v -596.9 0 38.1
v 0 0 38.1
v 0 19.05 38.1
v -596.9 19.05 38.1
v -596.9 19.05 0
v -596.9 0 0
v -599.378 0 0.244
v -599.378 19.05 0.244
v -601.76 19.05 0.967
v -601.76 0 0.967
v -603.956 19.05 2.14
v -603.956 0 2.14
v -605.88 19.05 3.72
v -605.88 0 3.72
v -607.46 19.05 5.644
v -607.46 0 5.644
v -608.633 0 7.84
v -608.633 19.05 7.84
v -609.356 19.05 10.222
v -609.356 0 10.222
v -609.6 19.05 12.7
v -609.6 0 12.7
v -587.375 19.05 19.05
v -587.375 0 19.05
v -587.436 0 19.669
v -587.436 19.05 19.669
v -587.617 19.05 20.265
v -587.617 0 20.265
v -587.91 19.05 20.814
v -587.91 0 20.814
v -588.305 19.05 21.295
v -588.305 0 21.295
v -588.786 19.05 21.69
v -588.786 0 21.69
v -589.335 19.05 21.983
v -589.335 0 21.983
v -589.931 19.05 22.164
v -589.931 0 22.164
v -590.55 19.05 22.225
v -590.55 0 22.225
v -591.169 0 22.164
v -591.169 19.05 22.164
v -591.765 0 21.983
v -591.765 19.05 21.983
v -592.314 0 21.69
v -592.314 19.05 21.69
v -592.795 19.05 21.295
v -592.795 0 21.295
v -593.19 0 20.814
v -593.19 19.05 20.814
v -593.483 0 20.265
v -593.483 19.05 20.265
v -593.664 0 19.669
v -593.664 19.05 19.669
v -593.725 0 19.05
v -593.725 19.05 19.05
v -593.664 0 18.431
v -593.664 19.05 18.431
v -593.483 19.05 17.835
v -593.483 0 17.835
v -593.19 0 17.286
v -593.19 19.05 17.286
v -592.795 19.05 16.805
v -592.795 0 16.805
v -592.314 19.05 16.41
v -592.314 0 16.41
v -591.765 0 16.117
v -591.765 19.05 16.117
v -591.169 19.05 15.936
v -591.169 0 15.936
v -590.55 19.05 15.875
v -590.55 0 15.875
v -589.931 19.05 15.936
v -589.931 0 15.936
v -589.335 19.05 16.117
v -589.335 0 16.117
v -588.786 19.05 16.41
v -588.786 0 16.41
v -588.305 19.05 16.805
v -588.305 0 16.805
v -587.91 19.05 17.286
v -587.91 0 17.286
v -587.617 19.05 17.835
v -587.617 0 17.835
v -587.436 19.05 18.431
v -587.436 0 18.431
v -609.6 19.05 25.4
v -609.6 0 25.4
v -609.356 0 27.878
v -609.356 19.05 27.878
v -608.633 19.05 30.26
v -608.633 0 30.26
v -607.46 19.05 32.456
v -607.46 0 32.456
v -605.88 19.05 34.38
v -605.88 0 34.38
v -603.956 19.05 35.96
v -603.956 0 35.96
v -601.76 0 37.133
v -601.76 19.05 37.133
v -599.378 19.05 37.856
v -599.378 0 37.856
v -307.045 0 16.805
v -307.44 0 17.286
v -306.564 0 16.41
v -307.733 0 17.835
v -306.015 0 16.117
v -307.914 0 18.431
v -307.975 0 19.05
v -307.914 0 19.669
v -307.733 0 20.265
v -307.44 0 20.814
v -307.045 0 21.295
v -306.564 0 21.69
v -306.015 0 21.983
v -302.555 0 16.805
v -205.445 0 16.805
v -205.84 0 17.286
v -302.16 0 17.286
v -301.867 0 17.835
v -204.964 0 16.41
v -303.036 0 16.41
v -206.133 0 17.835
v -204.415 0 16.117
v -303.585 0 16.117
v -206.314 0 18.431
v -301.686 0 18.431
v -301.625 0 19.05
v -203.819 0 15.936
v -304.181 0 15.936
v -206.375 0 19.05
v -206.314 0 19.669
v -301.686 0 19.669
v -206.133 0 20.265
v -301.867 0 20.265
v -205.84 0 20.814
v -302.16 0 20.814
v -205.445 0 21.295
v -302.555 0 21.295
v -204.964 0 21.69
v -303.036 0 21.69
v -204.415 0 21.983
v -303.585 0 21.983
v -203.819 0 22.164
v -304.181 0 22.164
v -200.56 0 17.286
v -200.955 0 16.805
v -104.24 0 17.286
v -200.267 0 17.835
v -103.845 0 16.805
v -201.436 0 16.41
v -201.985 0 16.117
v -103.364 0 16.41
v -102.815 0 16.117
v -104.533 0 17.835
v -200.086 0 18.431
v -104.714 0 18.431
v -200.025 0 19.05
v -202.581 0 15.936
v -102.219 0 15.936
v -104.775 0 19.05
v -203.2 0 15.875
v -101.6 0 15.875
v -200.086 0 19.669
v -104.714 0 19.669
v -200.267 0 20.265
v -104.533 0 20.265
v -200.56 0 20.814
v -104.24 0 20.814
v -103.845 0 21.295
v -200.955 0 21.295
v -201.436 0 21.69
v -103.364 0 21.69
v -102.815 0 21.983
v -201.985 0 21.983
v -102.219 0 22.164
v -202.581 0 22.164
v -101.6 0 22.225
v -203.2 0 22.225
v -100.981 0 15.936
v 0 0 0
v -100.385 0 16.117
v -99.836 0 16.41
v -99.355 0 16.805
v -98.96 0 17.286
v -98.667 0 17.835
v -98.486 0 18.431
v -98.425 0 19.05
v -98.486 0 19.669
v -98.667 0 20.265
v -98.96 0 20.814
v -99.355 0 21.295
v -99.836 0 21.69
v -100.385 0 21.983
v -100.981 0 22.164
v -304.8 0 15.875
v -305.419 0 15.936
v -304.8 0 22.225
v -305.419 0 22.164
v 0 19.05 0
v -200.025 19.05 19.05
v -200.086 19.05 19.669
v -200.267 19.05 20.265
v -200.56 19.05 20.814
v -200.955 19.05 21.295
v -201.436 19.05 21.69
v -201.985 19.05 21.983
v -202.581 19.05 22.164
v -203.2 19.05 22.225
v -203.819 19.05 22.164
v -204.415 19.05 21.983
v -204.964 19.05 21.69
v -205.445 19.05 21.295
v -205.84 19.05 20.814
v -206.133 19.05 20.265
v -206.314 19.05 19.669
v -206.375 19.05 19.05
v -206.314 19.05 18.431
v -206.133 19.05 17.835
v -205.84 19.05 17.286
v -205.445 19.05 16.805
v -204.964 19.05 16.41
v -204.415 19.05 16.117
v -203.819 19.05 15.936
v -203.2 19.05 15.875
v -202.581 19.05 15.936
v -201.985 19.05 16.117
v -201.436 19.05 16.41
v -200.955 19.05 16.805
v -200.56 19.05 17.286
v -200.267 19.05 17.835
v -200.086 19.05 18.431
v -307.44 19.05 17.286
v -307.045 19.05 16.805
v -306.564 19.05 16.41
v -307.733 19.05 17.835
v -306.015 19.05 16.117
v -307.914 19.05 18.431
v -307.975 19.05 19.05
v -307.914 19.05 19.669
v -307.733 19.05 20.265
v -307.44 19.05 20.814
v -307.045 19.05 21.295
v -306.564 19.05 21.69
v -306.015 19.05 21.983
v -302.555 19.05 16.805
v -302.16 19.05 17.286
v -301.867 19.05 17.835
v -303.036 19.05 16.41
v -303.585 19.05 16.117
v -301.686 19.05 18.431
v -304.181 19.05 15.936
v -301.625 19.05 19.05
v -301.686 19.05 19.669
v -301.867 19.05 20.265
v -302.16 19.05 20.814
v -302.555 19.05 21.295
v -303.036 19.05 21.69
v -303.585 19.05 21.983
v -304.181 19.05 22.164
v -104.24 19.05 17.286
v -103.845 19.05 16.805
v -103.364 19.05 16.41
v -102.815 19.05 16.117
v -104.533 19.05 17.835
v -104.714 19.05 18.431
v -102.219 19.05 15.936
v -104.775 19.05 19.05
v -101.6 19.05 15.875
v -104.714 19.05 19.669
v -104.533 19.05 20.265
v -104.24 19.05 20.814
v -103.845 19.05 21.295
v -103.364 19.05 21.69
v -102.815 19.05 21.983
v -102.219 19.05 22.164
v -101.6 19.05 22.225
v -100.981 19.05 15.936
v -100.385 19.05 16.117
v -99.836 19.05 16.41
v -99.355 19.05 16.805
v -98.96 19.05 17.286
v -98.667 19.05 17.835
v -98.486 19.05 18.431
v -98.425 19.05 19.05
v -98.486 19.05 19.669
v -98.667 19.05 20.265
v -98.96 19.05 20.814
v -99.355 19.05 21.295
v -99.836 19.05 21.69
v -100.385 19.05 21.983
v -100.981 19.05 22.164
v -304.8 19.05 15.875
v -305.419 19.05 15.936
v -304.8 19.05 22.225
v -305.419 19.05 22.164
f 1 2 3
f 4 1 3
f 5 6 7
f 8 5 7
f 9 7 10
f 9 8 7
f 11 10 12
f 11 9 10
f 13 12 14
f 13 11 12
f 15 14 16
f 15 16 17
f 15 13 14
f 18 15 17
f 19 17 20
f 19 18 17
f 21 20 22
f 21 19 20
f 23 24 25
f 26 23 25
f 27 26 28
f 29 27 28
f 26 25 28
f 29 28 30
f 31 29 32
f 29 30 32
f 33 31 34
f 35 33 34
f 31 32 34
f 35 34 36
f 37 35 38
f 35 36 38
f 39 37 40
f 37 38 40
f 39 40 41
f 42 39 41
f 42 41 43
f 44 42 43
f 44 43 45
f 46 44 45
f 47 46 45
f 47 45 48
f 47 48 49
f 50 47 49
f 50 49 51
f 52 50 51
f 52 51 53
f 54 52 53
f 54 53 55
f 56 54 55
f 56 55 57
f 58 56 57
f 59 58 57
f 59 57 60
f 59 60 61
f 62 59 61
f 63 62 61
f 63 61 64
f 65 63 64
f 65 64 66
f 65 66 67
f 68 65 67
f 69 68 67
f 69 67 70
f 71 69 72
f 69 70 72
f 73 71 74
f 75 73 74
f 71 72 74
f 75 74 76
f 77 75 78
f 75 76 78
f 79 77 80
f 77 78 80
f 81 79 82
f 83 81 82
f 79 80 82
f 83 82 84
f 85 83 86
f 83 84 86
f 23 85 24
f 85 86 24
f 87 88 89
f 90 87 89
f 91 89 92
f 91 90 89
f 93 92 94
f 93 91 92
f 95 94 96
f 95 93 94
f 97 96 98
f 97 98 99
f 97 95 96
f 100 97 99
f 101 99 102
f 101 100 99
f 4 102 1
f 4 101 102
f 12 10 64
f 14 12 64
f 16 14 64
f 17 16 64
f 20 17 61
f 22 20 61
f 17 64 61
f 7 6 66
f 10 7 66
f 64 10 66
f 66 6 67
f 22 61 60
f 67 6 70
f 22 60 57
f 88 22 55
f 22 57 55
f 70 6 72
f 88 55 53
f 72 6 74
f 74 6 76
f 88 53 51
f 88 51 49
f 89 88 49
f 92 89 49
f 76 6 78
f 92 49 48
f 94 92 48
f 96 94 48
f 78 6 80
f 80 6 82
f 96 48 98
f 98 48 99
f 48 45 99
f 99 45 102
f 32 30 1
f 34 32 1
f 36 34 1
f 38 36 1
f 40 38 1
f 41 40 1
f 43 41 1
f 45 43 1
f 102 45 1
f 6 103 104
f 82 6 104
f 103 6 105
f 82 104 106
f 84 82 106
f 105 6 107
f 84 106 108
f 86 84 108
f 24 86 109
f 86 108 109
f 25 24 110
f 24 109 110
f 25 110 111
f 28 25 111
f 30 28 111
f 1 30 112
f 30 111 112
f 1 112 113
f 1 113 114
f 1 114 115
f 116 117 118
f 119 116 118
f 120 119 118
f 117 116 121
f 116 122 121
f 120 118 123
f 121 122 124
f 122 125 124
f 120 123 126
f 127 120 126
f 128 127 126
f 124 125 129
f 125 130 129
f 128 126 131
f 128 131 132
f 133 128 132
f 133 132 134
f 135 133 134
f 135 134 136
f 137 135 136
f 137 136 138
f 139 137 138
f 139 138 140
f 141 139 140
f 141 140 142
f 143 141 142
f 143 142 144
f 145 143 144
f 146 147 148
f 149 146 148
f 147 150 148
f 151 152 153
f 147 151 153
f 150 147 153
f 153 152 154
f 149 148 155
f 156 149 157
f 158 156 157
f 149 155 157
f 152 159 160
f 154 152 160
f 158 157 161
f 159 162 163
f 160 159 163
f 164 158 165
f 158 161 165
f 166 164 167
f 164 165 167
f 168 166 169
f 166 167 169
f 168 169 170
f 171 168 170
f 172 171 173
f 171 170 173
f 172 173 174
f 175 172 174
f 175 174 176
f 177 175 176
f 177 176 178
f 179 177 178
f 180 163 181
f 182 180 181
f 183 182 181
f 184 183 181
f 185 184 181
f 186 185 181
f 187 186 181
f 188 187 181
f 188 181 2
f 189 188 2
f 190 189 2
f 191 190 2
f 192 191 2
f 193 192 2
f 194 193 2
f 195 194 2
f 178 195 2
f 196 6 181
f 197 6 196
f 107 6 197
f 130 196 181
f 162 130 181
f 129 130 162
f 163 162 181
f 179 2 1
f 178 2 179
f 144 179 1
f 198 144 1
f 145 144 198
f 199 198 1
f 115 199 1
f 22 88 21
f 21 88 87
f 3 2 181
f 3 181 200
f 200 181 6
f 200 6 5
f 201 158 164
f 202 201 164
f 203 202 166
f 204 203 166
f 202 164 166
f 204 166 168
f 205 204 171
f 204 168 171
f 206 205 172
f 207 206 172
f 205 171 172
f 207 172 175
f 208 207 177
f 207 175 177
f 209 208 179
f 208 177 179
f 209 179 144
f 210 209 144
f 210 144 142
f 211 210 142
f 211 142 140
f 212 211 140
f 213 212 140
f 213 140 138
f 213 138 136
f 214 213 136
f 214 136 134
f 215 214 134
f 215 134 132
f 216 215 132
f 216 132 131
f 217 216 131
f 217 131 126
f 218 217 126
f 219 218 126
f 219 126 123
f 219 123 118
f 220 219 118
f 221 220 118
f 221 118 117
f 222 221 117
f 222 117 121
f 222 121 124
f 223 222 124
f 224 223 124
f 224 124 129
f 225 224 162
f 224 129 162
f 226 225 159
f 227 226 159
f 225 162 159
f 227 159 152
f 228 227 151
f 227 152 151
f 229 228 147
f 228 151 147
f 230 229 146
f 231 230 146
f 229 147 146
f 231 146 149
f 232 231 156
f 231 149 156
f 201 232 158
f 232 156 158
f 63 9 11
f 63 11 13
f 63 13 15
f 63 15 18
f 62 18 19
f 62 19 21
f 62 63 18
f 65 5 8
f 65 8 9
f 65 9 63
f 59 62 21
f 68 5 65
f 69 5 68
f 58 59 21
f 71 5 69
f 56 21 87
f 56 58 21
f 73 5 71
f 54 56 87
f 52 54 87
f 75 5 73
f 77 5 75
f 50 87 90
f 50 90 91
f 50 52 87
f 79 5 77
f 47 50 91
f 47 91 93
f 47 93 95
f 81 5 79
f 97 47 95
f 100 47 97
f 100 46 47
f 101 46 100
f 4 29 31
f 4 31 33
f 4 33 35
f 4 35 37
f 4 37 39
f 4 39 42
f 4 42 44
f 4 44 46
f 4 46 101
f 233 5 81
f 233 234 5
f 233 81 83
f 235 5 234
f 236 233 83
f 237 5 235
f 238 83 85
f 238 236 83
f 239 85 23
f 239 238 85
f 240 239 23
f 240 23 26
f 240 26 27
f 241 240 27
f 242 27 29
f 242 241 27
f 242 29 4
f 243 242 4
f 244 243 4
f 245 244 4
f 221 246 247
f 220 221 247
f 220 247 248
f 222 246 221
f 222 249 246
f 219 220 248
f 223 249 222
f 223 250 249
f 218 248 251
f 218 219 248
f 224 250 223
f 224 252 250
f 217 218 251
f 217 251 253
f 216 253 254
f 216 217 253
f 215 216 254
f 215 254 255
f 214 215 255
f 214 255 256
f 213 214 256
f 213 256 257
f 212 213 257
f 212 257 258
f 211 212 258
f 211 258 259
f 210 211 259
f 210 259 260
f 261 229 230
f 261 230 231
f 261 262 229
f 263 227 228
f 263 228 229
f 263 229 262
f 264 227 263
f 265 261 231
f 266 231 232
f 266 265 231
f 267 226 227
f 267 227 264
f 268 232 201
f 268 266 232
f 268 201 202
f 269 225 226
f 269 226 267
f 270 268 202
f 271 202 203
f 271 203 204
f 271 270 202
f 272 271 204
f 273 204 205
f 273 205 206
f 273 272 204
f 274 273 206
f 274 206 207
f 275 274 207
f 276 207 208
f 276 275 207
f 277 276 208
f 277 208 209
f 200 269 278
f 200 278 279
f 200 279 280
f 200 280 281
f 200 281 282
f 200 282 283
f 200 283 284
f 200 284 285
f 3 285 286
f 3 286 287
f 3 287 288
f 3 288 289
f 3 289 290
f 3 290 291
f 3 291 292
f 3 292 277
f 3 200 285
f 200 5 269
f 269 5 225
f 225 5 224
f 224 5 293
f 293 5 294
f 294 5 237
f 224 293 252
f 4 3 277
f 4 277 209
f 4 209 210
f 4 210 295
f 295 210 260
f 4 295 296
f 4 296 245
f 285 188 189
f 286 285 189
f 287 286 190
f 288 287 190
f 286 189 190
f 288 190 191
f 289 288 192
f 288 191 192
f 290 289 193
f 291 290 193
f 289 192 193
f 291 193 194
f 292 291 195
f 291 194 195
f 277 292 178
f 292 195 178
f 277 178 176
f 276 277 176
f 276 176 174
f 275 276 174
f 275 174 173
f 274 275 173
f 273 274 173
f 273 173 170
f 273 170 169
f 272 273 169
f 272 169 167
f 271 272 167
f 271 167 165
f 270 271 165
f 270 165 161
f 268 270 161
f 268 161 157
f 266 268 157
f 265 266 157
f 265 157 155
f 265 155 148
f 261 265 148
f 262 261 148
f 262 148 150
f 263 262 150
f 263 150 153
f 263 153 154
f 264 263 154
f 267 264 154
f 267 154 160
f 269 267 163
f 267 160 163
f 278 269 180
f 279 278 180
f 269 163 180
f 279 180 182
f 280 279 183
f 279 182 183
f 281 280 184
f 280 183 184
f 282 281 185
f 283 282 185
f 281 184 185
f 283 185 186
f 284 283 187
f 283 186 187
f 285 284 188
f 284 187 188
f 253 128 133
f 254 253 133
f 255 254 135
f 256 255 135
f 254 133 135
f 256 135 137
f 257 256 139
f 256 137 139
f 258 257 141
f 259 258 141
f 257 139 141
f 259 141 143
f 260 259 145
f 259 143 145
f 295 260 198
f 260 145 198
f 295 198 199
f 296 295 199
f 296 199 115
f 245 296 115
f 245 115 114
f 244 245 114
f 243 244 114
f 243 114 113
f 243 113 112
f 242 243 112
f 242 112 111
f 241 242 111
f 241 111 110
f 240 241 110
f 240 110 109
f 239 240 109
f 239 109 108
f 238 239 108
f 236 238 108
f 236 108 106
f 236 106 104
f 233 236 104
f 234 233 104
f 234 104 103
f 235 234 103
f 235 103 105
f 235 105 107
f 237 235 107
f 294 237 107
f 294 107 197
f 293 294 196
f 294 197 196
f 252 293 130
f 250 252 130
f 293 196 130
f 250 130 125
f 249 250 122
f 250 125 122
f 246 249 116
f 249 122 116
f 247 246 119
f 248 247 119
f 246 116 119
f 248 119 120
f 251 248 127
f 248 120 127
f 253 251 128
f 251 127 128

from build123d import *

# Parameters (mm, degrees)
F0_W     = 19.05
F0_H     = 38.1
F1_DEPTH = 609.6
F2_R     = 3.175
F3_DEPTH = 19.051
F4_R     = 12.7


with BuildPart() as f1:
    # F0 (on Right) → F1 (new body)
    with BuildSketch(Plane.YZ):
        with Locations((9.525, 19.05)):
            Rectangle(F0_W, F0_H)
    extrude(amount=-F1_DEPTH)

    # F2 (on face) → F3 (cut, through all)
    with BuildSketch(Plane.XZ):
        with Locations((-101.6, 19.05)):
            Circle(F2_R)
        with Locations((-203.2, 19.05)):
            Circle(F2_R)
        with Locations((-304.8, 19.05)):
            Circle(F2_R)
        with Locations((-590.55, 19.05)):
            Circle(F2_R)
    extrude(amount=-F3_DEPTH, mode=Mode.SUBTRACT)

    # F4
    f4_edges = [f1.edges().sort_by_distance(p)[0] for p in [
        (-609.6, 9.525, 38.1),
        (-609.6, 9.525, 0),
    ]]
    fillet(f4_edges, radius=F4_R)


solid = f1.part
